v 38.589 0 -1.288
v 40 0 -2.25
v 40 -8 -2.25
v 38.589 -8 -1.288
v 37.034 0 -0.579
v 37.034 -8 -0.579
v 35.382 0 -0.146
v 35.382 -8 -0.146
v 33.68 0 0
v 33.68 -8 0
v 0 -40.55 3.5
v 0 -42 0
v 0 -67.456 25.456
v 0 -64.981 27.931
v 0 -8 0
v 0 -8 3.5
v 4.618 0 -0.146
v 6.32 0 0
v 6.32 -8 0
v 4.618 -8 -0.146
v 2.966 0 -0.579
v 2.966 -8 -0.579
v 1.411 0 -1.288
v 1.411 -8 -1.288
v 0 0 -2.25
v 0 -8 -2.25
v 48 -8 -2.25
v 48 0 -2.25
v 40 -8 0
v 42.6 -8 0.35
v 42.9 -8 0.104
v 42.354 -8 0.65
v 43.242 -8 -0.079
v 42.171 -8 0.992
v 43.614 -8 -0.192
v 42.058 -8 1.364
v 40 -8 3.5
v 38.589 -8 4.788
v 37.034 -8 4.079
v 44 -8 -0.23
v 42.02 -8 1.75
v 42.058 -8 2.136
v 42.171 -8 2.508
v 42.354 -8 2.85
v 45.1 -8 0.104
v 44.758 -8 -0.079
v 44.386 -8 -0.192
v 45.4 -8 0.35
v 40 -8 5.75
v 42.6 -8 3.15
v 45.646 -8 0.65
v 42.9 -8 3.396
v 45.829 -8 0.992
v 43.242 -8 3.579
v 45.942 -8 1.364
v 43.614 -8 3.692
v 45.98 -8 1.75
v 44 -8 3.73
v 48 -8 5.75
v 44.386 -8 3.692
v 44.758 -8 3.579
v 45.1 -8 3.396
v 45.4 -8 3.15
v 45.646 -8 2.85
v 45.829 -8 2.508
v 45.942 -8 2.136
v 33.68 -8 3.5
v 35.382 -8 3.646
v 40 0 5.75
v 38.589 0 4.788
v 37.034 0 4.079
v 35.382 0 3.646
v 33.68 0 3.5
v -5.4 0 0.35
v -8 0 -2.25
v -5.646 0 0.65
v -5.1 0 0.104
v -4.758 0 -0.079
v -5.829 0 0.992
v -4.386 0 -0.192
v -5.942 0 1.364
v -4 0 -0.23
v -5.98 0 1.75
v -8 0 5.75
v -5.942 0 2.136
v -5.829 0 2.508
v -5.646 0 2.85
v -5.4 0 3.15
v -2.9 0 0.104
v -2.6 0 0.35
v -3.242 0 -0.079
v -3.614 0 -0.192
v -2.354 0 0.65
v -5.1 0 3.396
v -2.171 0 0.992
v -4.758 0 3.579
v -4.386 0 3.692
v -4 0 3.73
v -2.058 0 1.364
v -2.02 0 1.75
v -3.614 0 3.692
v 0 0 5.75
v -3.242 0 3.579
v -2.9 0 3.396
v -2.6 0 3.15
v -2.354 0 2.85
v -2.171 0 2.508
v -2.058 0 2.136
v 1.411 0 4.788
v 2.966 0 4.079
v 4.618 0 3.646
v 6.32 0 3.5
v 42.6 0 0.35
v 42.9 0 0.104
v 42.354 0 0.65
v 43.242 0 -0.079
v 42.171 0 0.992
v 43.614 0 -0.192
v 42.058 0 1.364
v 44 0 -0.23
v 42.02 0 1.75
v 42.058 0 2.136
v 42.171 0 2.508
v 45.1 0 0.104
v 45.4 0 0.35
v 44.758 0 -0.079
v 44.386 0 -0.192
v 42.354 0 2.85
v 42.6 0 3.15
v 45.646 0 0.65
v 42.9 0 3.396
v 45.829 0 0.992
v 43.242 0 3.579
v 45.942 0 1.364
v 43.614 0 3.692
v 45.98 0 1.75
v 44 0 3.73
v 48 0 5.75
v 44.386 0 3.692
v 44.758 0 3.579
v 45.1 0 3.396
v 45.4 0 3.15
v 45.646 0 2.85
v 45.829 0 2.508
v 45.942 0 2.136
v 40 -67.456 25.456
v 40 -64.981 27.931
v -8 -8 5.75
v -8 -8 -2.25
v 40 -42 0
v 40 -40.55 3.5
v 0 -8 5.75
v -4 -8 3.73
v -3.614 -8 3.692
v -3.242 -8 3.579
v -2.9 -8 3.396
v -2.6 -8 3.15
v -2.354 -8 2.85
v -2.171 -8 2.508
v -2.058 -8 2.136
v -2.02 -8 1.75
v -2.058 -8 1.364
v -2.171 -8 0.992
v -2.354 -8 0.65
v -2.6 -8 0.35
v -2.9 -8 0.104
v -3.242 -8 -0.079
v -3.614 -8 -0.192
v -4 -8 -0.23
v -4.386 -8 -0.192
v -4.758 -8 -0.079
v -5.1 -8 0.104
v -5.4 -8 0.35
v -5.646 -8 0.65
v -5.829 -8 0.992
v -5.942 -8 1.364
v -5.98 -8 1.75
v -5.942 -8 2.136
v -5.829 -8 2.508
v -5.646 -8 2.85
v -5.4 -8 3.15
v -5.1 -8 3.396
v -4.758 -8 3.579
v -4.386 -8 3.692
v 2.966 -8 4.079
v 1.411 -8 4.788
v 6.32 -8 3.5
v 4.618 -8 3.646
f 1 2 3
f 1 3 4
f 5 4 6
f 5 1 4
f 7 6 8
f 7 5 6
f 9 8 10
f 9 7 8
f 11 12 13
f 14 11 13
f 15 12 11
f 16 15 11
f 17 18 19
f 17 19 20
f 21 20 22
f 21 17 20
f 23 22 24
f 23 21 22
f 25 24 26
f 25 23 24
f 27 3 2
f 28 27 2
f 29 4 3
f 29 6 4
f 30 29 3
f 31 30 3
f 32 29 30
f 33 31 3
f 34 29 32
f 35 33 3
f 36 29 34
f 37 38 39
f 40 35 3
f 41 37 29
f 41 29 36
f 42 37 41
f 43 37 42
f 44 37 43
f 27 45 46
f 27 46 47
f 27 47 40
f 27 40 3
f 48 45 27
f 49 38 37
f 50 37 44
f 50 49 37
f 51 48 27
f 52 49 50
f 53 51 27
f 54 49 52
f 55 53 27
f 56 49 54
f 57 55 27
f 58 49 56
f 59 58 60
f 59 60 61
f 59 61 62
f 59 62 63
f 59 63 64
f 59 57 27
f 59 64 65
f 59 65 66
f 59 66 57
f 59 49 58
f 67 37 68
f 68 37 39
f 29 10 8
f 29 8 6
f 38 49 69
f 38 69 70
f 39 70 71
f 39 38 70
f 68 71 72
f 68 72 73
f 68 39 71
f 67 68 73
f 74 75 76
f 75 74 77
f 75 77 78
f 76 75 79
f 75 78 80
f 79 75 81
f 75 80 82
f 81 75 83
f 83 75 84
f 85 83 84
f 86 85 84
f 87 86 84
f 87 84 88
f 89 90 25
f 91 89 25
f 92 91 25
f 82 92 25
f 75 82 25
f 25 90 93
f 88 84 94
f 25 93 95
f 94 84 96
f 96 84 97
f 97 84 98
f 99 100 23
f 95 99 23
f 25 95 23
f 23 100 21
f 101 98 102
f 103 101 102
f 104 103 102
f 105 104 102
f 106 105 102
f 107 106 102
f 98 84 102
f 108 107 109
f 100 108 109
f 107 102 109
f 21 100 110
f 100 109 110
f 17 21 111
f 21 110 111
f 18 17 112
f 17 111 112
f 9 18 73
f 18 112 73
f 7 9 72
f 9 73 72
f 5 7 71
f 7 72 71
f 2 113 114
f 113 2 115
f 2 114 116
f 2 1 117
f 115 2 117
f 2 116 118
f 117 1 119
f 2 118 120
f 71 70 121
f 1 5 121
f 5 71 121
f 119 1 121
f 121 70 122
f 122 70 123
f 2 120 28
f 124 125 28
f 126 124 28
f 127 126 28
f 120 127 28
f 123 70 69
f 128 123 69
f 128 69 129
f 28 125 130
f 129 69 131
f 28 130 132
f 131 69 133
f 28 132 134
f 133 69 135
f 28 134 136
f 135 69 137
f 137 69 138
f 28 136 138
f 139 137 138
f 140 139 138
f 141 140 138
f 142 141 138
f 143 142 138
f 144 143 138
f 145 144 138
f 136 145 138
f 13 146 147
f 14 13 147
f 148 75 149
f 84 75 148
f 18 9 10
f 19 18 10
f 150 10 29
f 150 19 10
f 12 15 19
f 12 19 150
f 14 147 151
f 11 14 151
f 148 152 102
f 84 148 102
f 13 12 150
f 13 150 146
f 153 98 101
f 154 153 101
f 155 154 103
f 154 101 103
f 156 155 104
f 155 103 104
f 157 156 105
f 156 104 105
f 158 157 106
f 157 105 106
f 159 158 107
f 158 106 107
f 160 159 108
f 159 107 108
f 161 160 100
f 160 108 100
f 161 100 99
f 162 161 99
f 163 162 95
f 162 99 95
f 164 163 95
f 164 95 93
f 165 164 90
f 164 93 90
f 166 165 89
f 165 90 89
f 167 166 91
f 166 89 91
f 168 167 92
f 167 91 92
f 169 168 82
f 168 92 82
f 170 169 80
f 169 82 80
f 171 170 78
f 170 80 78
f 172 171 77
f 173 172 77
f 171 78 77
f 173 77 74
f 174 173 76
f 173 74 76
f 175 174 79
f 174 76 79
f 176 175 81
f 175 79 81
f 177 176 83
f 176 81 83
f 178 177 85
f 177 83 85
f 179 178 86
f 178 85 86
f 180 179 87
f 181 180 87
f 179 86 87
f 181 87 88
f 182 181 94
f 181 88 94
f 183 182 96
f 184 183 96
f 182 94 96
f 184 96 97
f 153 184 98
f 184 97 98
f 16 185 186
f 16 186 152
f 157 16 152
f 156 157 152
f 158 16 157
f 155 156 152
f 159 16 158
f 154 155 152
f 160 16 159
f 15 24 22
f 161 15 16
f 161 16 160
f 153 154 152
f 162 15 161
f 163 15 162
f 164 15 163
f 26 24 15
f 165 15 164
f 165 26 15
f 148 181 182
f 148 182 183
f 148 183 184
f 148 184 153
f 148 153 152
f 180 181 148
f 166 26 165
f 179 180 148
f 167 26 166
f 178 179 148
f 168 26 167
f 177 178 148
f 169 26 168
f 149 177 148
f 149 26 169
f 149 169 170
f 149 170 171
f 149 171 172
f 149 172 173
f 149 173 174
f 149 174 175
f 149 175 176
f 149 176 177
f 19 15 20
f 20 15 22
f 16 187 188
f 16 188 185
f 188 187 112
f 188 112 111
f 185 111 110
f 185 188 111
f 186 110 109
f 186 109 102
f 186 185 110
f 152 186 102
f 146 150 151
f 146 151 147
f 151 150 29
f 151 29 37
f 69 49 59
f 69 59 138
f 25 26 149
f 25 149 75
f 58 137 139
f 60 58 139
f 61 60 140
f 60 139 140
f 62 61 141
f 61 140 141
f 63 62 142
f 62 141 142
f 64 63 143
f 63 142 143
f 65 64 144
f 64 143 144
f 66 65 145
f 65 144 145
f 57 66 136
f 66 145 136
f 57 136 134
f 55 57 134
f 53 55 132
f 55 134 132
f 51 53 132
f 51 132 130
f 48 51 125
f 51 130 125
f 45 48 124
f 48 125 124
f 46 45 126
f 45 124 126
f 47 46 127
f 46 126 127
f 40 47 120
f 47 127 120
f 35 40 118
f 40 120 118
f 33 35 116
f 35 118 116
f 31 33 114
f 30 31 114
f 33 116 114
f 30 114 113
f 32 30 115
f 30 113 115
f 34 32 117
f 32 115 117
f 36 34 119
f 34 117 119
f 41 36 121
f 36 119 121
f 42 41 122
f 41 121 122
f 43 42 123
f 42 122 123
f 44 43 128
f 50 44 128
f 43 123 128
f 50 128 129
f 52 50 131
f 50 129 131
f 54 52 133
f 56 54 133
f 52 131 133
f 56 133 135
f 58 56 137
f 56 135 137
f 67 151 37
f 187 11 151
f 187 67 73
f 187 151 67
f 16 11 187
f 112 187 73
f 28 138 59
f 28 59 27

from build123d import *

# Parameters (mm, degrees)
EXTRUDE_1_DEPTH     = 40
SKETCH_4_W          = 8
SKETCH_4_H          = 8
EXTRUDE_2_DEPTH     = 8
SKETCH_5_R          = 1.98
CUT_EXTRUDE_2_DEPTH = 8
FILLET_1_R          = 10
FILLET_2_R          = 10
SKETCH_6_W          = 8
SKETCH_6_H          = 8
EXTRUDE_3_DEPTH     = 8
SKETCH_7_R          = 1.98
CUT_EXTRUDE_3_DEPTH = 8
FILLET_3_R          = 10
FILLET_4_R          = 10


with BuildPart() as part:
    # 草图2 → 凸台-拉伸1 (new body)
    with BuildSketch(Plane(origin=(0, 0, 0), x_dir=(0, 0, -1), z_dir=(1, 0, 0))):
        Polygon((0, 0), (0, -42), (-25.455844123, -67.455844123), (-27.930717857, -64.980970389), (-3.5, -40.550252532), (-3.5, 0), align=None)
    extrude(amount=EXTRUDE_1_DEPTH)

    # 草图4 → 凸台-拉伸2 (add)
    with BuildSketch(Plane.ZY):
        with Locations((1.75, -4)):
            Rectangle(SKETCH_4_W, SKETCH_4_H)
    extrude(amount=EXTRUDE_2_DEPTH)

    # 草图5 → 切除-拉伸2 (cut)
    with BuildSketch(Plane(origin=(0, 0, 0), x_dir=(1, 0, 0), z_dir=(0, 1, 0))):
        with Locations(Location((-4, -1.75, 0), (0, 0, 270))):
            Circle(SKETCH_5_R)
    extrude(amount=-CUT_EXTRUDE_2_DEPTH, mode=Mode.SUBTRACT)

    # 圆角1
    # the kernel refuses this fillet: 10 mm, written as the material it adds along each edge
    with BuildSketch(Plane(origin=(0, 0, 0), x_dir=(1, 0, 0), z_dir=(0, -1, 0))) as fillet_1_piece_1:
        with BuildLine():
            CenterArc((6.31961233, -10), FILLET_1_R, 90, 39.194967426)
            Line((0, -2.25), (0, 0))
            Line((0, 0), (6.31961233, 0))
        make_face()
    extrude(amount=8)

    # 圆角2
    # the kernel refuses this fillet: 10 mm, written as the material it adds along each edge
    with BuildSketch(Plane(origin=(0, -8, 3.5), x_dir=(1, 0, 0), z_dir=(0, 1, 0))) as fillet_2_piece_1:
        with BuildLine():
            CenterArc((6.31961233, -10), FILLET_2_R, 90, 39.194967426)
            Line((0, -2.25), (0, 0))
            Line((0, 0), (6.31961233, 0))
        make_face()
    extrude(amount=8)

    # 草图6 → 凸台-拉伸3 (add)
    with BuildSketch(Plane(origin=(40, 0, 0), x_dir=(0, 0, -1), z_dir=(1, 0, 0))):
        with Locations((-1.75, -4)):
            Rectangle(SKETCH_6_W, SKETCH_6_H)
    extrude(amount=EXTRUDE_3_DEPTH)

    # 草图7 → 切除-拉伸3 (cut)
    with BuildSketch(Plane(origin=(0, 0, 0), x_dir=(1, 0, 0), z_dir=(0, 1, 0))):
        with Locations(Location((44, -1.75, 0), (0, 0, 270))):
            Circle(SKETCH_7_R)
    extrude(amount=-CUT_EXTRUDE_3_DEPTH, mode=Mode.SUBTRACT)

    # 圆角3
    # the kernel refuses this fillet: 10 mm, written as the material it adds along each edge
    with BuildSketch(Plane(origin=(40, 0, 0), x_dir=(-1, 0, 0), z_dir=(0, -1, 0))) as fillet_3_piece_1:
        with BuildLine():
            CenterArc((6.31961233, 10), FILLET_3_R, 230.805032574, 39.194967426)
            Line((0, 2.25), (0, 0))
            Line((0, 0), (6.31961233, 0))
        make_face()
    extrude(amount=8)

    # 圆角4
    # the kernel refuses this fillet: 10 mm, written as the material it adds along each edge
    with BuildSketch(Plane(origin=(40, -8, 3.5), x_dir=(-1, 0, 0), z_dir=(0, 1, 0))) as fillet_4_piece_1:
        with BuildLine():
            CenterArc((6.31961233, 10), FILLET_4_R, 230.805032574, 39.194967426)
            Line((0, 2.25), (0, 0))
            Line((0, 0), (6.31961233, 0))
        make_face()
    extrude(amount=8)


solid = part.part
